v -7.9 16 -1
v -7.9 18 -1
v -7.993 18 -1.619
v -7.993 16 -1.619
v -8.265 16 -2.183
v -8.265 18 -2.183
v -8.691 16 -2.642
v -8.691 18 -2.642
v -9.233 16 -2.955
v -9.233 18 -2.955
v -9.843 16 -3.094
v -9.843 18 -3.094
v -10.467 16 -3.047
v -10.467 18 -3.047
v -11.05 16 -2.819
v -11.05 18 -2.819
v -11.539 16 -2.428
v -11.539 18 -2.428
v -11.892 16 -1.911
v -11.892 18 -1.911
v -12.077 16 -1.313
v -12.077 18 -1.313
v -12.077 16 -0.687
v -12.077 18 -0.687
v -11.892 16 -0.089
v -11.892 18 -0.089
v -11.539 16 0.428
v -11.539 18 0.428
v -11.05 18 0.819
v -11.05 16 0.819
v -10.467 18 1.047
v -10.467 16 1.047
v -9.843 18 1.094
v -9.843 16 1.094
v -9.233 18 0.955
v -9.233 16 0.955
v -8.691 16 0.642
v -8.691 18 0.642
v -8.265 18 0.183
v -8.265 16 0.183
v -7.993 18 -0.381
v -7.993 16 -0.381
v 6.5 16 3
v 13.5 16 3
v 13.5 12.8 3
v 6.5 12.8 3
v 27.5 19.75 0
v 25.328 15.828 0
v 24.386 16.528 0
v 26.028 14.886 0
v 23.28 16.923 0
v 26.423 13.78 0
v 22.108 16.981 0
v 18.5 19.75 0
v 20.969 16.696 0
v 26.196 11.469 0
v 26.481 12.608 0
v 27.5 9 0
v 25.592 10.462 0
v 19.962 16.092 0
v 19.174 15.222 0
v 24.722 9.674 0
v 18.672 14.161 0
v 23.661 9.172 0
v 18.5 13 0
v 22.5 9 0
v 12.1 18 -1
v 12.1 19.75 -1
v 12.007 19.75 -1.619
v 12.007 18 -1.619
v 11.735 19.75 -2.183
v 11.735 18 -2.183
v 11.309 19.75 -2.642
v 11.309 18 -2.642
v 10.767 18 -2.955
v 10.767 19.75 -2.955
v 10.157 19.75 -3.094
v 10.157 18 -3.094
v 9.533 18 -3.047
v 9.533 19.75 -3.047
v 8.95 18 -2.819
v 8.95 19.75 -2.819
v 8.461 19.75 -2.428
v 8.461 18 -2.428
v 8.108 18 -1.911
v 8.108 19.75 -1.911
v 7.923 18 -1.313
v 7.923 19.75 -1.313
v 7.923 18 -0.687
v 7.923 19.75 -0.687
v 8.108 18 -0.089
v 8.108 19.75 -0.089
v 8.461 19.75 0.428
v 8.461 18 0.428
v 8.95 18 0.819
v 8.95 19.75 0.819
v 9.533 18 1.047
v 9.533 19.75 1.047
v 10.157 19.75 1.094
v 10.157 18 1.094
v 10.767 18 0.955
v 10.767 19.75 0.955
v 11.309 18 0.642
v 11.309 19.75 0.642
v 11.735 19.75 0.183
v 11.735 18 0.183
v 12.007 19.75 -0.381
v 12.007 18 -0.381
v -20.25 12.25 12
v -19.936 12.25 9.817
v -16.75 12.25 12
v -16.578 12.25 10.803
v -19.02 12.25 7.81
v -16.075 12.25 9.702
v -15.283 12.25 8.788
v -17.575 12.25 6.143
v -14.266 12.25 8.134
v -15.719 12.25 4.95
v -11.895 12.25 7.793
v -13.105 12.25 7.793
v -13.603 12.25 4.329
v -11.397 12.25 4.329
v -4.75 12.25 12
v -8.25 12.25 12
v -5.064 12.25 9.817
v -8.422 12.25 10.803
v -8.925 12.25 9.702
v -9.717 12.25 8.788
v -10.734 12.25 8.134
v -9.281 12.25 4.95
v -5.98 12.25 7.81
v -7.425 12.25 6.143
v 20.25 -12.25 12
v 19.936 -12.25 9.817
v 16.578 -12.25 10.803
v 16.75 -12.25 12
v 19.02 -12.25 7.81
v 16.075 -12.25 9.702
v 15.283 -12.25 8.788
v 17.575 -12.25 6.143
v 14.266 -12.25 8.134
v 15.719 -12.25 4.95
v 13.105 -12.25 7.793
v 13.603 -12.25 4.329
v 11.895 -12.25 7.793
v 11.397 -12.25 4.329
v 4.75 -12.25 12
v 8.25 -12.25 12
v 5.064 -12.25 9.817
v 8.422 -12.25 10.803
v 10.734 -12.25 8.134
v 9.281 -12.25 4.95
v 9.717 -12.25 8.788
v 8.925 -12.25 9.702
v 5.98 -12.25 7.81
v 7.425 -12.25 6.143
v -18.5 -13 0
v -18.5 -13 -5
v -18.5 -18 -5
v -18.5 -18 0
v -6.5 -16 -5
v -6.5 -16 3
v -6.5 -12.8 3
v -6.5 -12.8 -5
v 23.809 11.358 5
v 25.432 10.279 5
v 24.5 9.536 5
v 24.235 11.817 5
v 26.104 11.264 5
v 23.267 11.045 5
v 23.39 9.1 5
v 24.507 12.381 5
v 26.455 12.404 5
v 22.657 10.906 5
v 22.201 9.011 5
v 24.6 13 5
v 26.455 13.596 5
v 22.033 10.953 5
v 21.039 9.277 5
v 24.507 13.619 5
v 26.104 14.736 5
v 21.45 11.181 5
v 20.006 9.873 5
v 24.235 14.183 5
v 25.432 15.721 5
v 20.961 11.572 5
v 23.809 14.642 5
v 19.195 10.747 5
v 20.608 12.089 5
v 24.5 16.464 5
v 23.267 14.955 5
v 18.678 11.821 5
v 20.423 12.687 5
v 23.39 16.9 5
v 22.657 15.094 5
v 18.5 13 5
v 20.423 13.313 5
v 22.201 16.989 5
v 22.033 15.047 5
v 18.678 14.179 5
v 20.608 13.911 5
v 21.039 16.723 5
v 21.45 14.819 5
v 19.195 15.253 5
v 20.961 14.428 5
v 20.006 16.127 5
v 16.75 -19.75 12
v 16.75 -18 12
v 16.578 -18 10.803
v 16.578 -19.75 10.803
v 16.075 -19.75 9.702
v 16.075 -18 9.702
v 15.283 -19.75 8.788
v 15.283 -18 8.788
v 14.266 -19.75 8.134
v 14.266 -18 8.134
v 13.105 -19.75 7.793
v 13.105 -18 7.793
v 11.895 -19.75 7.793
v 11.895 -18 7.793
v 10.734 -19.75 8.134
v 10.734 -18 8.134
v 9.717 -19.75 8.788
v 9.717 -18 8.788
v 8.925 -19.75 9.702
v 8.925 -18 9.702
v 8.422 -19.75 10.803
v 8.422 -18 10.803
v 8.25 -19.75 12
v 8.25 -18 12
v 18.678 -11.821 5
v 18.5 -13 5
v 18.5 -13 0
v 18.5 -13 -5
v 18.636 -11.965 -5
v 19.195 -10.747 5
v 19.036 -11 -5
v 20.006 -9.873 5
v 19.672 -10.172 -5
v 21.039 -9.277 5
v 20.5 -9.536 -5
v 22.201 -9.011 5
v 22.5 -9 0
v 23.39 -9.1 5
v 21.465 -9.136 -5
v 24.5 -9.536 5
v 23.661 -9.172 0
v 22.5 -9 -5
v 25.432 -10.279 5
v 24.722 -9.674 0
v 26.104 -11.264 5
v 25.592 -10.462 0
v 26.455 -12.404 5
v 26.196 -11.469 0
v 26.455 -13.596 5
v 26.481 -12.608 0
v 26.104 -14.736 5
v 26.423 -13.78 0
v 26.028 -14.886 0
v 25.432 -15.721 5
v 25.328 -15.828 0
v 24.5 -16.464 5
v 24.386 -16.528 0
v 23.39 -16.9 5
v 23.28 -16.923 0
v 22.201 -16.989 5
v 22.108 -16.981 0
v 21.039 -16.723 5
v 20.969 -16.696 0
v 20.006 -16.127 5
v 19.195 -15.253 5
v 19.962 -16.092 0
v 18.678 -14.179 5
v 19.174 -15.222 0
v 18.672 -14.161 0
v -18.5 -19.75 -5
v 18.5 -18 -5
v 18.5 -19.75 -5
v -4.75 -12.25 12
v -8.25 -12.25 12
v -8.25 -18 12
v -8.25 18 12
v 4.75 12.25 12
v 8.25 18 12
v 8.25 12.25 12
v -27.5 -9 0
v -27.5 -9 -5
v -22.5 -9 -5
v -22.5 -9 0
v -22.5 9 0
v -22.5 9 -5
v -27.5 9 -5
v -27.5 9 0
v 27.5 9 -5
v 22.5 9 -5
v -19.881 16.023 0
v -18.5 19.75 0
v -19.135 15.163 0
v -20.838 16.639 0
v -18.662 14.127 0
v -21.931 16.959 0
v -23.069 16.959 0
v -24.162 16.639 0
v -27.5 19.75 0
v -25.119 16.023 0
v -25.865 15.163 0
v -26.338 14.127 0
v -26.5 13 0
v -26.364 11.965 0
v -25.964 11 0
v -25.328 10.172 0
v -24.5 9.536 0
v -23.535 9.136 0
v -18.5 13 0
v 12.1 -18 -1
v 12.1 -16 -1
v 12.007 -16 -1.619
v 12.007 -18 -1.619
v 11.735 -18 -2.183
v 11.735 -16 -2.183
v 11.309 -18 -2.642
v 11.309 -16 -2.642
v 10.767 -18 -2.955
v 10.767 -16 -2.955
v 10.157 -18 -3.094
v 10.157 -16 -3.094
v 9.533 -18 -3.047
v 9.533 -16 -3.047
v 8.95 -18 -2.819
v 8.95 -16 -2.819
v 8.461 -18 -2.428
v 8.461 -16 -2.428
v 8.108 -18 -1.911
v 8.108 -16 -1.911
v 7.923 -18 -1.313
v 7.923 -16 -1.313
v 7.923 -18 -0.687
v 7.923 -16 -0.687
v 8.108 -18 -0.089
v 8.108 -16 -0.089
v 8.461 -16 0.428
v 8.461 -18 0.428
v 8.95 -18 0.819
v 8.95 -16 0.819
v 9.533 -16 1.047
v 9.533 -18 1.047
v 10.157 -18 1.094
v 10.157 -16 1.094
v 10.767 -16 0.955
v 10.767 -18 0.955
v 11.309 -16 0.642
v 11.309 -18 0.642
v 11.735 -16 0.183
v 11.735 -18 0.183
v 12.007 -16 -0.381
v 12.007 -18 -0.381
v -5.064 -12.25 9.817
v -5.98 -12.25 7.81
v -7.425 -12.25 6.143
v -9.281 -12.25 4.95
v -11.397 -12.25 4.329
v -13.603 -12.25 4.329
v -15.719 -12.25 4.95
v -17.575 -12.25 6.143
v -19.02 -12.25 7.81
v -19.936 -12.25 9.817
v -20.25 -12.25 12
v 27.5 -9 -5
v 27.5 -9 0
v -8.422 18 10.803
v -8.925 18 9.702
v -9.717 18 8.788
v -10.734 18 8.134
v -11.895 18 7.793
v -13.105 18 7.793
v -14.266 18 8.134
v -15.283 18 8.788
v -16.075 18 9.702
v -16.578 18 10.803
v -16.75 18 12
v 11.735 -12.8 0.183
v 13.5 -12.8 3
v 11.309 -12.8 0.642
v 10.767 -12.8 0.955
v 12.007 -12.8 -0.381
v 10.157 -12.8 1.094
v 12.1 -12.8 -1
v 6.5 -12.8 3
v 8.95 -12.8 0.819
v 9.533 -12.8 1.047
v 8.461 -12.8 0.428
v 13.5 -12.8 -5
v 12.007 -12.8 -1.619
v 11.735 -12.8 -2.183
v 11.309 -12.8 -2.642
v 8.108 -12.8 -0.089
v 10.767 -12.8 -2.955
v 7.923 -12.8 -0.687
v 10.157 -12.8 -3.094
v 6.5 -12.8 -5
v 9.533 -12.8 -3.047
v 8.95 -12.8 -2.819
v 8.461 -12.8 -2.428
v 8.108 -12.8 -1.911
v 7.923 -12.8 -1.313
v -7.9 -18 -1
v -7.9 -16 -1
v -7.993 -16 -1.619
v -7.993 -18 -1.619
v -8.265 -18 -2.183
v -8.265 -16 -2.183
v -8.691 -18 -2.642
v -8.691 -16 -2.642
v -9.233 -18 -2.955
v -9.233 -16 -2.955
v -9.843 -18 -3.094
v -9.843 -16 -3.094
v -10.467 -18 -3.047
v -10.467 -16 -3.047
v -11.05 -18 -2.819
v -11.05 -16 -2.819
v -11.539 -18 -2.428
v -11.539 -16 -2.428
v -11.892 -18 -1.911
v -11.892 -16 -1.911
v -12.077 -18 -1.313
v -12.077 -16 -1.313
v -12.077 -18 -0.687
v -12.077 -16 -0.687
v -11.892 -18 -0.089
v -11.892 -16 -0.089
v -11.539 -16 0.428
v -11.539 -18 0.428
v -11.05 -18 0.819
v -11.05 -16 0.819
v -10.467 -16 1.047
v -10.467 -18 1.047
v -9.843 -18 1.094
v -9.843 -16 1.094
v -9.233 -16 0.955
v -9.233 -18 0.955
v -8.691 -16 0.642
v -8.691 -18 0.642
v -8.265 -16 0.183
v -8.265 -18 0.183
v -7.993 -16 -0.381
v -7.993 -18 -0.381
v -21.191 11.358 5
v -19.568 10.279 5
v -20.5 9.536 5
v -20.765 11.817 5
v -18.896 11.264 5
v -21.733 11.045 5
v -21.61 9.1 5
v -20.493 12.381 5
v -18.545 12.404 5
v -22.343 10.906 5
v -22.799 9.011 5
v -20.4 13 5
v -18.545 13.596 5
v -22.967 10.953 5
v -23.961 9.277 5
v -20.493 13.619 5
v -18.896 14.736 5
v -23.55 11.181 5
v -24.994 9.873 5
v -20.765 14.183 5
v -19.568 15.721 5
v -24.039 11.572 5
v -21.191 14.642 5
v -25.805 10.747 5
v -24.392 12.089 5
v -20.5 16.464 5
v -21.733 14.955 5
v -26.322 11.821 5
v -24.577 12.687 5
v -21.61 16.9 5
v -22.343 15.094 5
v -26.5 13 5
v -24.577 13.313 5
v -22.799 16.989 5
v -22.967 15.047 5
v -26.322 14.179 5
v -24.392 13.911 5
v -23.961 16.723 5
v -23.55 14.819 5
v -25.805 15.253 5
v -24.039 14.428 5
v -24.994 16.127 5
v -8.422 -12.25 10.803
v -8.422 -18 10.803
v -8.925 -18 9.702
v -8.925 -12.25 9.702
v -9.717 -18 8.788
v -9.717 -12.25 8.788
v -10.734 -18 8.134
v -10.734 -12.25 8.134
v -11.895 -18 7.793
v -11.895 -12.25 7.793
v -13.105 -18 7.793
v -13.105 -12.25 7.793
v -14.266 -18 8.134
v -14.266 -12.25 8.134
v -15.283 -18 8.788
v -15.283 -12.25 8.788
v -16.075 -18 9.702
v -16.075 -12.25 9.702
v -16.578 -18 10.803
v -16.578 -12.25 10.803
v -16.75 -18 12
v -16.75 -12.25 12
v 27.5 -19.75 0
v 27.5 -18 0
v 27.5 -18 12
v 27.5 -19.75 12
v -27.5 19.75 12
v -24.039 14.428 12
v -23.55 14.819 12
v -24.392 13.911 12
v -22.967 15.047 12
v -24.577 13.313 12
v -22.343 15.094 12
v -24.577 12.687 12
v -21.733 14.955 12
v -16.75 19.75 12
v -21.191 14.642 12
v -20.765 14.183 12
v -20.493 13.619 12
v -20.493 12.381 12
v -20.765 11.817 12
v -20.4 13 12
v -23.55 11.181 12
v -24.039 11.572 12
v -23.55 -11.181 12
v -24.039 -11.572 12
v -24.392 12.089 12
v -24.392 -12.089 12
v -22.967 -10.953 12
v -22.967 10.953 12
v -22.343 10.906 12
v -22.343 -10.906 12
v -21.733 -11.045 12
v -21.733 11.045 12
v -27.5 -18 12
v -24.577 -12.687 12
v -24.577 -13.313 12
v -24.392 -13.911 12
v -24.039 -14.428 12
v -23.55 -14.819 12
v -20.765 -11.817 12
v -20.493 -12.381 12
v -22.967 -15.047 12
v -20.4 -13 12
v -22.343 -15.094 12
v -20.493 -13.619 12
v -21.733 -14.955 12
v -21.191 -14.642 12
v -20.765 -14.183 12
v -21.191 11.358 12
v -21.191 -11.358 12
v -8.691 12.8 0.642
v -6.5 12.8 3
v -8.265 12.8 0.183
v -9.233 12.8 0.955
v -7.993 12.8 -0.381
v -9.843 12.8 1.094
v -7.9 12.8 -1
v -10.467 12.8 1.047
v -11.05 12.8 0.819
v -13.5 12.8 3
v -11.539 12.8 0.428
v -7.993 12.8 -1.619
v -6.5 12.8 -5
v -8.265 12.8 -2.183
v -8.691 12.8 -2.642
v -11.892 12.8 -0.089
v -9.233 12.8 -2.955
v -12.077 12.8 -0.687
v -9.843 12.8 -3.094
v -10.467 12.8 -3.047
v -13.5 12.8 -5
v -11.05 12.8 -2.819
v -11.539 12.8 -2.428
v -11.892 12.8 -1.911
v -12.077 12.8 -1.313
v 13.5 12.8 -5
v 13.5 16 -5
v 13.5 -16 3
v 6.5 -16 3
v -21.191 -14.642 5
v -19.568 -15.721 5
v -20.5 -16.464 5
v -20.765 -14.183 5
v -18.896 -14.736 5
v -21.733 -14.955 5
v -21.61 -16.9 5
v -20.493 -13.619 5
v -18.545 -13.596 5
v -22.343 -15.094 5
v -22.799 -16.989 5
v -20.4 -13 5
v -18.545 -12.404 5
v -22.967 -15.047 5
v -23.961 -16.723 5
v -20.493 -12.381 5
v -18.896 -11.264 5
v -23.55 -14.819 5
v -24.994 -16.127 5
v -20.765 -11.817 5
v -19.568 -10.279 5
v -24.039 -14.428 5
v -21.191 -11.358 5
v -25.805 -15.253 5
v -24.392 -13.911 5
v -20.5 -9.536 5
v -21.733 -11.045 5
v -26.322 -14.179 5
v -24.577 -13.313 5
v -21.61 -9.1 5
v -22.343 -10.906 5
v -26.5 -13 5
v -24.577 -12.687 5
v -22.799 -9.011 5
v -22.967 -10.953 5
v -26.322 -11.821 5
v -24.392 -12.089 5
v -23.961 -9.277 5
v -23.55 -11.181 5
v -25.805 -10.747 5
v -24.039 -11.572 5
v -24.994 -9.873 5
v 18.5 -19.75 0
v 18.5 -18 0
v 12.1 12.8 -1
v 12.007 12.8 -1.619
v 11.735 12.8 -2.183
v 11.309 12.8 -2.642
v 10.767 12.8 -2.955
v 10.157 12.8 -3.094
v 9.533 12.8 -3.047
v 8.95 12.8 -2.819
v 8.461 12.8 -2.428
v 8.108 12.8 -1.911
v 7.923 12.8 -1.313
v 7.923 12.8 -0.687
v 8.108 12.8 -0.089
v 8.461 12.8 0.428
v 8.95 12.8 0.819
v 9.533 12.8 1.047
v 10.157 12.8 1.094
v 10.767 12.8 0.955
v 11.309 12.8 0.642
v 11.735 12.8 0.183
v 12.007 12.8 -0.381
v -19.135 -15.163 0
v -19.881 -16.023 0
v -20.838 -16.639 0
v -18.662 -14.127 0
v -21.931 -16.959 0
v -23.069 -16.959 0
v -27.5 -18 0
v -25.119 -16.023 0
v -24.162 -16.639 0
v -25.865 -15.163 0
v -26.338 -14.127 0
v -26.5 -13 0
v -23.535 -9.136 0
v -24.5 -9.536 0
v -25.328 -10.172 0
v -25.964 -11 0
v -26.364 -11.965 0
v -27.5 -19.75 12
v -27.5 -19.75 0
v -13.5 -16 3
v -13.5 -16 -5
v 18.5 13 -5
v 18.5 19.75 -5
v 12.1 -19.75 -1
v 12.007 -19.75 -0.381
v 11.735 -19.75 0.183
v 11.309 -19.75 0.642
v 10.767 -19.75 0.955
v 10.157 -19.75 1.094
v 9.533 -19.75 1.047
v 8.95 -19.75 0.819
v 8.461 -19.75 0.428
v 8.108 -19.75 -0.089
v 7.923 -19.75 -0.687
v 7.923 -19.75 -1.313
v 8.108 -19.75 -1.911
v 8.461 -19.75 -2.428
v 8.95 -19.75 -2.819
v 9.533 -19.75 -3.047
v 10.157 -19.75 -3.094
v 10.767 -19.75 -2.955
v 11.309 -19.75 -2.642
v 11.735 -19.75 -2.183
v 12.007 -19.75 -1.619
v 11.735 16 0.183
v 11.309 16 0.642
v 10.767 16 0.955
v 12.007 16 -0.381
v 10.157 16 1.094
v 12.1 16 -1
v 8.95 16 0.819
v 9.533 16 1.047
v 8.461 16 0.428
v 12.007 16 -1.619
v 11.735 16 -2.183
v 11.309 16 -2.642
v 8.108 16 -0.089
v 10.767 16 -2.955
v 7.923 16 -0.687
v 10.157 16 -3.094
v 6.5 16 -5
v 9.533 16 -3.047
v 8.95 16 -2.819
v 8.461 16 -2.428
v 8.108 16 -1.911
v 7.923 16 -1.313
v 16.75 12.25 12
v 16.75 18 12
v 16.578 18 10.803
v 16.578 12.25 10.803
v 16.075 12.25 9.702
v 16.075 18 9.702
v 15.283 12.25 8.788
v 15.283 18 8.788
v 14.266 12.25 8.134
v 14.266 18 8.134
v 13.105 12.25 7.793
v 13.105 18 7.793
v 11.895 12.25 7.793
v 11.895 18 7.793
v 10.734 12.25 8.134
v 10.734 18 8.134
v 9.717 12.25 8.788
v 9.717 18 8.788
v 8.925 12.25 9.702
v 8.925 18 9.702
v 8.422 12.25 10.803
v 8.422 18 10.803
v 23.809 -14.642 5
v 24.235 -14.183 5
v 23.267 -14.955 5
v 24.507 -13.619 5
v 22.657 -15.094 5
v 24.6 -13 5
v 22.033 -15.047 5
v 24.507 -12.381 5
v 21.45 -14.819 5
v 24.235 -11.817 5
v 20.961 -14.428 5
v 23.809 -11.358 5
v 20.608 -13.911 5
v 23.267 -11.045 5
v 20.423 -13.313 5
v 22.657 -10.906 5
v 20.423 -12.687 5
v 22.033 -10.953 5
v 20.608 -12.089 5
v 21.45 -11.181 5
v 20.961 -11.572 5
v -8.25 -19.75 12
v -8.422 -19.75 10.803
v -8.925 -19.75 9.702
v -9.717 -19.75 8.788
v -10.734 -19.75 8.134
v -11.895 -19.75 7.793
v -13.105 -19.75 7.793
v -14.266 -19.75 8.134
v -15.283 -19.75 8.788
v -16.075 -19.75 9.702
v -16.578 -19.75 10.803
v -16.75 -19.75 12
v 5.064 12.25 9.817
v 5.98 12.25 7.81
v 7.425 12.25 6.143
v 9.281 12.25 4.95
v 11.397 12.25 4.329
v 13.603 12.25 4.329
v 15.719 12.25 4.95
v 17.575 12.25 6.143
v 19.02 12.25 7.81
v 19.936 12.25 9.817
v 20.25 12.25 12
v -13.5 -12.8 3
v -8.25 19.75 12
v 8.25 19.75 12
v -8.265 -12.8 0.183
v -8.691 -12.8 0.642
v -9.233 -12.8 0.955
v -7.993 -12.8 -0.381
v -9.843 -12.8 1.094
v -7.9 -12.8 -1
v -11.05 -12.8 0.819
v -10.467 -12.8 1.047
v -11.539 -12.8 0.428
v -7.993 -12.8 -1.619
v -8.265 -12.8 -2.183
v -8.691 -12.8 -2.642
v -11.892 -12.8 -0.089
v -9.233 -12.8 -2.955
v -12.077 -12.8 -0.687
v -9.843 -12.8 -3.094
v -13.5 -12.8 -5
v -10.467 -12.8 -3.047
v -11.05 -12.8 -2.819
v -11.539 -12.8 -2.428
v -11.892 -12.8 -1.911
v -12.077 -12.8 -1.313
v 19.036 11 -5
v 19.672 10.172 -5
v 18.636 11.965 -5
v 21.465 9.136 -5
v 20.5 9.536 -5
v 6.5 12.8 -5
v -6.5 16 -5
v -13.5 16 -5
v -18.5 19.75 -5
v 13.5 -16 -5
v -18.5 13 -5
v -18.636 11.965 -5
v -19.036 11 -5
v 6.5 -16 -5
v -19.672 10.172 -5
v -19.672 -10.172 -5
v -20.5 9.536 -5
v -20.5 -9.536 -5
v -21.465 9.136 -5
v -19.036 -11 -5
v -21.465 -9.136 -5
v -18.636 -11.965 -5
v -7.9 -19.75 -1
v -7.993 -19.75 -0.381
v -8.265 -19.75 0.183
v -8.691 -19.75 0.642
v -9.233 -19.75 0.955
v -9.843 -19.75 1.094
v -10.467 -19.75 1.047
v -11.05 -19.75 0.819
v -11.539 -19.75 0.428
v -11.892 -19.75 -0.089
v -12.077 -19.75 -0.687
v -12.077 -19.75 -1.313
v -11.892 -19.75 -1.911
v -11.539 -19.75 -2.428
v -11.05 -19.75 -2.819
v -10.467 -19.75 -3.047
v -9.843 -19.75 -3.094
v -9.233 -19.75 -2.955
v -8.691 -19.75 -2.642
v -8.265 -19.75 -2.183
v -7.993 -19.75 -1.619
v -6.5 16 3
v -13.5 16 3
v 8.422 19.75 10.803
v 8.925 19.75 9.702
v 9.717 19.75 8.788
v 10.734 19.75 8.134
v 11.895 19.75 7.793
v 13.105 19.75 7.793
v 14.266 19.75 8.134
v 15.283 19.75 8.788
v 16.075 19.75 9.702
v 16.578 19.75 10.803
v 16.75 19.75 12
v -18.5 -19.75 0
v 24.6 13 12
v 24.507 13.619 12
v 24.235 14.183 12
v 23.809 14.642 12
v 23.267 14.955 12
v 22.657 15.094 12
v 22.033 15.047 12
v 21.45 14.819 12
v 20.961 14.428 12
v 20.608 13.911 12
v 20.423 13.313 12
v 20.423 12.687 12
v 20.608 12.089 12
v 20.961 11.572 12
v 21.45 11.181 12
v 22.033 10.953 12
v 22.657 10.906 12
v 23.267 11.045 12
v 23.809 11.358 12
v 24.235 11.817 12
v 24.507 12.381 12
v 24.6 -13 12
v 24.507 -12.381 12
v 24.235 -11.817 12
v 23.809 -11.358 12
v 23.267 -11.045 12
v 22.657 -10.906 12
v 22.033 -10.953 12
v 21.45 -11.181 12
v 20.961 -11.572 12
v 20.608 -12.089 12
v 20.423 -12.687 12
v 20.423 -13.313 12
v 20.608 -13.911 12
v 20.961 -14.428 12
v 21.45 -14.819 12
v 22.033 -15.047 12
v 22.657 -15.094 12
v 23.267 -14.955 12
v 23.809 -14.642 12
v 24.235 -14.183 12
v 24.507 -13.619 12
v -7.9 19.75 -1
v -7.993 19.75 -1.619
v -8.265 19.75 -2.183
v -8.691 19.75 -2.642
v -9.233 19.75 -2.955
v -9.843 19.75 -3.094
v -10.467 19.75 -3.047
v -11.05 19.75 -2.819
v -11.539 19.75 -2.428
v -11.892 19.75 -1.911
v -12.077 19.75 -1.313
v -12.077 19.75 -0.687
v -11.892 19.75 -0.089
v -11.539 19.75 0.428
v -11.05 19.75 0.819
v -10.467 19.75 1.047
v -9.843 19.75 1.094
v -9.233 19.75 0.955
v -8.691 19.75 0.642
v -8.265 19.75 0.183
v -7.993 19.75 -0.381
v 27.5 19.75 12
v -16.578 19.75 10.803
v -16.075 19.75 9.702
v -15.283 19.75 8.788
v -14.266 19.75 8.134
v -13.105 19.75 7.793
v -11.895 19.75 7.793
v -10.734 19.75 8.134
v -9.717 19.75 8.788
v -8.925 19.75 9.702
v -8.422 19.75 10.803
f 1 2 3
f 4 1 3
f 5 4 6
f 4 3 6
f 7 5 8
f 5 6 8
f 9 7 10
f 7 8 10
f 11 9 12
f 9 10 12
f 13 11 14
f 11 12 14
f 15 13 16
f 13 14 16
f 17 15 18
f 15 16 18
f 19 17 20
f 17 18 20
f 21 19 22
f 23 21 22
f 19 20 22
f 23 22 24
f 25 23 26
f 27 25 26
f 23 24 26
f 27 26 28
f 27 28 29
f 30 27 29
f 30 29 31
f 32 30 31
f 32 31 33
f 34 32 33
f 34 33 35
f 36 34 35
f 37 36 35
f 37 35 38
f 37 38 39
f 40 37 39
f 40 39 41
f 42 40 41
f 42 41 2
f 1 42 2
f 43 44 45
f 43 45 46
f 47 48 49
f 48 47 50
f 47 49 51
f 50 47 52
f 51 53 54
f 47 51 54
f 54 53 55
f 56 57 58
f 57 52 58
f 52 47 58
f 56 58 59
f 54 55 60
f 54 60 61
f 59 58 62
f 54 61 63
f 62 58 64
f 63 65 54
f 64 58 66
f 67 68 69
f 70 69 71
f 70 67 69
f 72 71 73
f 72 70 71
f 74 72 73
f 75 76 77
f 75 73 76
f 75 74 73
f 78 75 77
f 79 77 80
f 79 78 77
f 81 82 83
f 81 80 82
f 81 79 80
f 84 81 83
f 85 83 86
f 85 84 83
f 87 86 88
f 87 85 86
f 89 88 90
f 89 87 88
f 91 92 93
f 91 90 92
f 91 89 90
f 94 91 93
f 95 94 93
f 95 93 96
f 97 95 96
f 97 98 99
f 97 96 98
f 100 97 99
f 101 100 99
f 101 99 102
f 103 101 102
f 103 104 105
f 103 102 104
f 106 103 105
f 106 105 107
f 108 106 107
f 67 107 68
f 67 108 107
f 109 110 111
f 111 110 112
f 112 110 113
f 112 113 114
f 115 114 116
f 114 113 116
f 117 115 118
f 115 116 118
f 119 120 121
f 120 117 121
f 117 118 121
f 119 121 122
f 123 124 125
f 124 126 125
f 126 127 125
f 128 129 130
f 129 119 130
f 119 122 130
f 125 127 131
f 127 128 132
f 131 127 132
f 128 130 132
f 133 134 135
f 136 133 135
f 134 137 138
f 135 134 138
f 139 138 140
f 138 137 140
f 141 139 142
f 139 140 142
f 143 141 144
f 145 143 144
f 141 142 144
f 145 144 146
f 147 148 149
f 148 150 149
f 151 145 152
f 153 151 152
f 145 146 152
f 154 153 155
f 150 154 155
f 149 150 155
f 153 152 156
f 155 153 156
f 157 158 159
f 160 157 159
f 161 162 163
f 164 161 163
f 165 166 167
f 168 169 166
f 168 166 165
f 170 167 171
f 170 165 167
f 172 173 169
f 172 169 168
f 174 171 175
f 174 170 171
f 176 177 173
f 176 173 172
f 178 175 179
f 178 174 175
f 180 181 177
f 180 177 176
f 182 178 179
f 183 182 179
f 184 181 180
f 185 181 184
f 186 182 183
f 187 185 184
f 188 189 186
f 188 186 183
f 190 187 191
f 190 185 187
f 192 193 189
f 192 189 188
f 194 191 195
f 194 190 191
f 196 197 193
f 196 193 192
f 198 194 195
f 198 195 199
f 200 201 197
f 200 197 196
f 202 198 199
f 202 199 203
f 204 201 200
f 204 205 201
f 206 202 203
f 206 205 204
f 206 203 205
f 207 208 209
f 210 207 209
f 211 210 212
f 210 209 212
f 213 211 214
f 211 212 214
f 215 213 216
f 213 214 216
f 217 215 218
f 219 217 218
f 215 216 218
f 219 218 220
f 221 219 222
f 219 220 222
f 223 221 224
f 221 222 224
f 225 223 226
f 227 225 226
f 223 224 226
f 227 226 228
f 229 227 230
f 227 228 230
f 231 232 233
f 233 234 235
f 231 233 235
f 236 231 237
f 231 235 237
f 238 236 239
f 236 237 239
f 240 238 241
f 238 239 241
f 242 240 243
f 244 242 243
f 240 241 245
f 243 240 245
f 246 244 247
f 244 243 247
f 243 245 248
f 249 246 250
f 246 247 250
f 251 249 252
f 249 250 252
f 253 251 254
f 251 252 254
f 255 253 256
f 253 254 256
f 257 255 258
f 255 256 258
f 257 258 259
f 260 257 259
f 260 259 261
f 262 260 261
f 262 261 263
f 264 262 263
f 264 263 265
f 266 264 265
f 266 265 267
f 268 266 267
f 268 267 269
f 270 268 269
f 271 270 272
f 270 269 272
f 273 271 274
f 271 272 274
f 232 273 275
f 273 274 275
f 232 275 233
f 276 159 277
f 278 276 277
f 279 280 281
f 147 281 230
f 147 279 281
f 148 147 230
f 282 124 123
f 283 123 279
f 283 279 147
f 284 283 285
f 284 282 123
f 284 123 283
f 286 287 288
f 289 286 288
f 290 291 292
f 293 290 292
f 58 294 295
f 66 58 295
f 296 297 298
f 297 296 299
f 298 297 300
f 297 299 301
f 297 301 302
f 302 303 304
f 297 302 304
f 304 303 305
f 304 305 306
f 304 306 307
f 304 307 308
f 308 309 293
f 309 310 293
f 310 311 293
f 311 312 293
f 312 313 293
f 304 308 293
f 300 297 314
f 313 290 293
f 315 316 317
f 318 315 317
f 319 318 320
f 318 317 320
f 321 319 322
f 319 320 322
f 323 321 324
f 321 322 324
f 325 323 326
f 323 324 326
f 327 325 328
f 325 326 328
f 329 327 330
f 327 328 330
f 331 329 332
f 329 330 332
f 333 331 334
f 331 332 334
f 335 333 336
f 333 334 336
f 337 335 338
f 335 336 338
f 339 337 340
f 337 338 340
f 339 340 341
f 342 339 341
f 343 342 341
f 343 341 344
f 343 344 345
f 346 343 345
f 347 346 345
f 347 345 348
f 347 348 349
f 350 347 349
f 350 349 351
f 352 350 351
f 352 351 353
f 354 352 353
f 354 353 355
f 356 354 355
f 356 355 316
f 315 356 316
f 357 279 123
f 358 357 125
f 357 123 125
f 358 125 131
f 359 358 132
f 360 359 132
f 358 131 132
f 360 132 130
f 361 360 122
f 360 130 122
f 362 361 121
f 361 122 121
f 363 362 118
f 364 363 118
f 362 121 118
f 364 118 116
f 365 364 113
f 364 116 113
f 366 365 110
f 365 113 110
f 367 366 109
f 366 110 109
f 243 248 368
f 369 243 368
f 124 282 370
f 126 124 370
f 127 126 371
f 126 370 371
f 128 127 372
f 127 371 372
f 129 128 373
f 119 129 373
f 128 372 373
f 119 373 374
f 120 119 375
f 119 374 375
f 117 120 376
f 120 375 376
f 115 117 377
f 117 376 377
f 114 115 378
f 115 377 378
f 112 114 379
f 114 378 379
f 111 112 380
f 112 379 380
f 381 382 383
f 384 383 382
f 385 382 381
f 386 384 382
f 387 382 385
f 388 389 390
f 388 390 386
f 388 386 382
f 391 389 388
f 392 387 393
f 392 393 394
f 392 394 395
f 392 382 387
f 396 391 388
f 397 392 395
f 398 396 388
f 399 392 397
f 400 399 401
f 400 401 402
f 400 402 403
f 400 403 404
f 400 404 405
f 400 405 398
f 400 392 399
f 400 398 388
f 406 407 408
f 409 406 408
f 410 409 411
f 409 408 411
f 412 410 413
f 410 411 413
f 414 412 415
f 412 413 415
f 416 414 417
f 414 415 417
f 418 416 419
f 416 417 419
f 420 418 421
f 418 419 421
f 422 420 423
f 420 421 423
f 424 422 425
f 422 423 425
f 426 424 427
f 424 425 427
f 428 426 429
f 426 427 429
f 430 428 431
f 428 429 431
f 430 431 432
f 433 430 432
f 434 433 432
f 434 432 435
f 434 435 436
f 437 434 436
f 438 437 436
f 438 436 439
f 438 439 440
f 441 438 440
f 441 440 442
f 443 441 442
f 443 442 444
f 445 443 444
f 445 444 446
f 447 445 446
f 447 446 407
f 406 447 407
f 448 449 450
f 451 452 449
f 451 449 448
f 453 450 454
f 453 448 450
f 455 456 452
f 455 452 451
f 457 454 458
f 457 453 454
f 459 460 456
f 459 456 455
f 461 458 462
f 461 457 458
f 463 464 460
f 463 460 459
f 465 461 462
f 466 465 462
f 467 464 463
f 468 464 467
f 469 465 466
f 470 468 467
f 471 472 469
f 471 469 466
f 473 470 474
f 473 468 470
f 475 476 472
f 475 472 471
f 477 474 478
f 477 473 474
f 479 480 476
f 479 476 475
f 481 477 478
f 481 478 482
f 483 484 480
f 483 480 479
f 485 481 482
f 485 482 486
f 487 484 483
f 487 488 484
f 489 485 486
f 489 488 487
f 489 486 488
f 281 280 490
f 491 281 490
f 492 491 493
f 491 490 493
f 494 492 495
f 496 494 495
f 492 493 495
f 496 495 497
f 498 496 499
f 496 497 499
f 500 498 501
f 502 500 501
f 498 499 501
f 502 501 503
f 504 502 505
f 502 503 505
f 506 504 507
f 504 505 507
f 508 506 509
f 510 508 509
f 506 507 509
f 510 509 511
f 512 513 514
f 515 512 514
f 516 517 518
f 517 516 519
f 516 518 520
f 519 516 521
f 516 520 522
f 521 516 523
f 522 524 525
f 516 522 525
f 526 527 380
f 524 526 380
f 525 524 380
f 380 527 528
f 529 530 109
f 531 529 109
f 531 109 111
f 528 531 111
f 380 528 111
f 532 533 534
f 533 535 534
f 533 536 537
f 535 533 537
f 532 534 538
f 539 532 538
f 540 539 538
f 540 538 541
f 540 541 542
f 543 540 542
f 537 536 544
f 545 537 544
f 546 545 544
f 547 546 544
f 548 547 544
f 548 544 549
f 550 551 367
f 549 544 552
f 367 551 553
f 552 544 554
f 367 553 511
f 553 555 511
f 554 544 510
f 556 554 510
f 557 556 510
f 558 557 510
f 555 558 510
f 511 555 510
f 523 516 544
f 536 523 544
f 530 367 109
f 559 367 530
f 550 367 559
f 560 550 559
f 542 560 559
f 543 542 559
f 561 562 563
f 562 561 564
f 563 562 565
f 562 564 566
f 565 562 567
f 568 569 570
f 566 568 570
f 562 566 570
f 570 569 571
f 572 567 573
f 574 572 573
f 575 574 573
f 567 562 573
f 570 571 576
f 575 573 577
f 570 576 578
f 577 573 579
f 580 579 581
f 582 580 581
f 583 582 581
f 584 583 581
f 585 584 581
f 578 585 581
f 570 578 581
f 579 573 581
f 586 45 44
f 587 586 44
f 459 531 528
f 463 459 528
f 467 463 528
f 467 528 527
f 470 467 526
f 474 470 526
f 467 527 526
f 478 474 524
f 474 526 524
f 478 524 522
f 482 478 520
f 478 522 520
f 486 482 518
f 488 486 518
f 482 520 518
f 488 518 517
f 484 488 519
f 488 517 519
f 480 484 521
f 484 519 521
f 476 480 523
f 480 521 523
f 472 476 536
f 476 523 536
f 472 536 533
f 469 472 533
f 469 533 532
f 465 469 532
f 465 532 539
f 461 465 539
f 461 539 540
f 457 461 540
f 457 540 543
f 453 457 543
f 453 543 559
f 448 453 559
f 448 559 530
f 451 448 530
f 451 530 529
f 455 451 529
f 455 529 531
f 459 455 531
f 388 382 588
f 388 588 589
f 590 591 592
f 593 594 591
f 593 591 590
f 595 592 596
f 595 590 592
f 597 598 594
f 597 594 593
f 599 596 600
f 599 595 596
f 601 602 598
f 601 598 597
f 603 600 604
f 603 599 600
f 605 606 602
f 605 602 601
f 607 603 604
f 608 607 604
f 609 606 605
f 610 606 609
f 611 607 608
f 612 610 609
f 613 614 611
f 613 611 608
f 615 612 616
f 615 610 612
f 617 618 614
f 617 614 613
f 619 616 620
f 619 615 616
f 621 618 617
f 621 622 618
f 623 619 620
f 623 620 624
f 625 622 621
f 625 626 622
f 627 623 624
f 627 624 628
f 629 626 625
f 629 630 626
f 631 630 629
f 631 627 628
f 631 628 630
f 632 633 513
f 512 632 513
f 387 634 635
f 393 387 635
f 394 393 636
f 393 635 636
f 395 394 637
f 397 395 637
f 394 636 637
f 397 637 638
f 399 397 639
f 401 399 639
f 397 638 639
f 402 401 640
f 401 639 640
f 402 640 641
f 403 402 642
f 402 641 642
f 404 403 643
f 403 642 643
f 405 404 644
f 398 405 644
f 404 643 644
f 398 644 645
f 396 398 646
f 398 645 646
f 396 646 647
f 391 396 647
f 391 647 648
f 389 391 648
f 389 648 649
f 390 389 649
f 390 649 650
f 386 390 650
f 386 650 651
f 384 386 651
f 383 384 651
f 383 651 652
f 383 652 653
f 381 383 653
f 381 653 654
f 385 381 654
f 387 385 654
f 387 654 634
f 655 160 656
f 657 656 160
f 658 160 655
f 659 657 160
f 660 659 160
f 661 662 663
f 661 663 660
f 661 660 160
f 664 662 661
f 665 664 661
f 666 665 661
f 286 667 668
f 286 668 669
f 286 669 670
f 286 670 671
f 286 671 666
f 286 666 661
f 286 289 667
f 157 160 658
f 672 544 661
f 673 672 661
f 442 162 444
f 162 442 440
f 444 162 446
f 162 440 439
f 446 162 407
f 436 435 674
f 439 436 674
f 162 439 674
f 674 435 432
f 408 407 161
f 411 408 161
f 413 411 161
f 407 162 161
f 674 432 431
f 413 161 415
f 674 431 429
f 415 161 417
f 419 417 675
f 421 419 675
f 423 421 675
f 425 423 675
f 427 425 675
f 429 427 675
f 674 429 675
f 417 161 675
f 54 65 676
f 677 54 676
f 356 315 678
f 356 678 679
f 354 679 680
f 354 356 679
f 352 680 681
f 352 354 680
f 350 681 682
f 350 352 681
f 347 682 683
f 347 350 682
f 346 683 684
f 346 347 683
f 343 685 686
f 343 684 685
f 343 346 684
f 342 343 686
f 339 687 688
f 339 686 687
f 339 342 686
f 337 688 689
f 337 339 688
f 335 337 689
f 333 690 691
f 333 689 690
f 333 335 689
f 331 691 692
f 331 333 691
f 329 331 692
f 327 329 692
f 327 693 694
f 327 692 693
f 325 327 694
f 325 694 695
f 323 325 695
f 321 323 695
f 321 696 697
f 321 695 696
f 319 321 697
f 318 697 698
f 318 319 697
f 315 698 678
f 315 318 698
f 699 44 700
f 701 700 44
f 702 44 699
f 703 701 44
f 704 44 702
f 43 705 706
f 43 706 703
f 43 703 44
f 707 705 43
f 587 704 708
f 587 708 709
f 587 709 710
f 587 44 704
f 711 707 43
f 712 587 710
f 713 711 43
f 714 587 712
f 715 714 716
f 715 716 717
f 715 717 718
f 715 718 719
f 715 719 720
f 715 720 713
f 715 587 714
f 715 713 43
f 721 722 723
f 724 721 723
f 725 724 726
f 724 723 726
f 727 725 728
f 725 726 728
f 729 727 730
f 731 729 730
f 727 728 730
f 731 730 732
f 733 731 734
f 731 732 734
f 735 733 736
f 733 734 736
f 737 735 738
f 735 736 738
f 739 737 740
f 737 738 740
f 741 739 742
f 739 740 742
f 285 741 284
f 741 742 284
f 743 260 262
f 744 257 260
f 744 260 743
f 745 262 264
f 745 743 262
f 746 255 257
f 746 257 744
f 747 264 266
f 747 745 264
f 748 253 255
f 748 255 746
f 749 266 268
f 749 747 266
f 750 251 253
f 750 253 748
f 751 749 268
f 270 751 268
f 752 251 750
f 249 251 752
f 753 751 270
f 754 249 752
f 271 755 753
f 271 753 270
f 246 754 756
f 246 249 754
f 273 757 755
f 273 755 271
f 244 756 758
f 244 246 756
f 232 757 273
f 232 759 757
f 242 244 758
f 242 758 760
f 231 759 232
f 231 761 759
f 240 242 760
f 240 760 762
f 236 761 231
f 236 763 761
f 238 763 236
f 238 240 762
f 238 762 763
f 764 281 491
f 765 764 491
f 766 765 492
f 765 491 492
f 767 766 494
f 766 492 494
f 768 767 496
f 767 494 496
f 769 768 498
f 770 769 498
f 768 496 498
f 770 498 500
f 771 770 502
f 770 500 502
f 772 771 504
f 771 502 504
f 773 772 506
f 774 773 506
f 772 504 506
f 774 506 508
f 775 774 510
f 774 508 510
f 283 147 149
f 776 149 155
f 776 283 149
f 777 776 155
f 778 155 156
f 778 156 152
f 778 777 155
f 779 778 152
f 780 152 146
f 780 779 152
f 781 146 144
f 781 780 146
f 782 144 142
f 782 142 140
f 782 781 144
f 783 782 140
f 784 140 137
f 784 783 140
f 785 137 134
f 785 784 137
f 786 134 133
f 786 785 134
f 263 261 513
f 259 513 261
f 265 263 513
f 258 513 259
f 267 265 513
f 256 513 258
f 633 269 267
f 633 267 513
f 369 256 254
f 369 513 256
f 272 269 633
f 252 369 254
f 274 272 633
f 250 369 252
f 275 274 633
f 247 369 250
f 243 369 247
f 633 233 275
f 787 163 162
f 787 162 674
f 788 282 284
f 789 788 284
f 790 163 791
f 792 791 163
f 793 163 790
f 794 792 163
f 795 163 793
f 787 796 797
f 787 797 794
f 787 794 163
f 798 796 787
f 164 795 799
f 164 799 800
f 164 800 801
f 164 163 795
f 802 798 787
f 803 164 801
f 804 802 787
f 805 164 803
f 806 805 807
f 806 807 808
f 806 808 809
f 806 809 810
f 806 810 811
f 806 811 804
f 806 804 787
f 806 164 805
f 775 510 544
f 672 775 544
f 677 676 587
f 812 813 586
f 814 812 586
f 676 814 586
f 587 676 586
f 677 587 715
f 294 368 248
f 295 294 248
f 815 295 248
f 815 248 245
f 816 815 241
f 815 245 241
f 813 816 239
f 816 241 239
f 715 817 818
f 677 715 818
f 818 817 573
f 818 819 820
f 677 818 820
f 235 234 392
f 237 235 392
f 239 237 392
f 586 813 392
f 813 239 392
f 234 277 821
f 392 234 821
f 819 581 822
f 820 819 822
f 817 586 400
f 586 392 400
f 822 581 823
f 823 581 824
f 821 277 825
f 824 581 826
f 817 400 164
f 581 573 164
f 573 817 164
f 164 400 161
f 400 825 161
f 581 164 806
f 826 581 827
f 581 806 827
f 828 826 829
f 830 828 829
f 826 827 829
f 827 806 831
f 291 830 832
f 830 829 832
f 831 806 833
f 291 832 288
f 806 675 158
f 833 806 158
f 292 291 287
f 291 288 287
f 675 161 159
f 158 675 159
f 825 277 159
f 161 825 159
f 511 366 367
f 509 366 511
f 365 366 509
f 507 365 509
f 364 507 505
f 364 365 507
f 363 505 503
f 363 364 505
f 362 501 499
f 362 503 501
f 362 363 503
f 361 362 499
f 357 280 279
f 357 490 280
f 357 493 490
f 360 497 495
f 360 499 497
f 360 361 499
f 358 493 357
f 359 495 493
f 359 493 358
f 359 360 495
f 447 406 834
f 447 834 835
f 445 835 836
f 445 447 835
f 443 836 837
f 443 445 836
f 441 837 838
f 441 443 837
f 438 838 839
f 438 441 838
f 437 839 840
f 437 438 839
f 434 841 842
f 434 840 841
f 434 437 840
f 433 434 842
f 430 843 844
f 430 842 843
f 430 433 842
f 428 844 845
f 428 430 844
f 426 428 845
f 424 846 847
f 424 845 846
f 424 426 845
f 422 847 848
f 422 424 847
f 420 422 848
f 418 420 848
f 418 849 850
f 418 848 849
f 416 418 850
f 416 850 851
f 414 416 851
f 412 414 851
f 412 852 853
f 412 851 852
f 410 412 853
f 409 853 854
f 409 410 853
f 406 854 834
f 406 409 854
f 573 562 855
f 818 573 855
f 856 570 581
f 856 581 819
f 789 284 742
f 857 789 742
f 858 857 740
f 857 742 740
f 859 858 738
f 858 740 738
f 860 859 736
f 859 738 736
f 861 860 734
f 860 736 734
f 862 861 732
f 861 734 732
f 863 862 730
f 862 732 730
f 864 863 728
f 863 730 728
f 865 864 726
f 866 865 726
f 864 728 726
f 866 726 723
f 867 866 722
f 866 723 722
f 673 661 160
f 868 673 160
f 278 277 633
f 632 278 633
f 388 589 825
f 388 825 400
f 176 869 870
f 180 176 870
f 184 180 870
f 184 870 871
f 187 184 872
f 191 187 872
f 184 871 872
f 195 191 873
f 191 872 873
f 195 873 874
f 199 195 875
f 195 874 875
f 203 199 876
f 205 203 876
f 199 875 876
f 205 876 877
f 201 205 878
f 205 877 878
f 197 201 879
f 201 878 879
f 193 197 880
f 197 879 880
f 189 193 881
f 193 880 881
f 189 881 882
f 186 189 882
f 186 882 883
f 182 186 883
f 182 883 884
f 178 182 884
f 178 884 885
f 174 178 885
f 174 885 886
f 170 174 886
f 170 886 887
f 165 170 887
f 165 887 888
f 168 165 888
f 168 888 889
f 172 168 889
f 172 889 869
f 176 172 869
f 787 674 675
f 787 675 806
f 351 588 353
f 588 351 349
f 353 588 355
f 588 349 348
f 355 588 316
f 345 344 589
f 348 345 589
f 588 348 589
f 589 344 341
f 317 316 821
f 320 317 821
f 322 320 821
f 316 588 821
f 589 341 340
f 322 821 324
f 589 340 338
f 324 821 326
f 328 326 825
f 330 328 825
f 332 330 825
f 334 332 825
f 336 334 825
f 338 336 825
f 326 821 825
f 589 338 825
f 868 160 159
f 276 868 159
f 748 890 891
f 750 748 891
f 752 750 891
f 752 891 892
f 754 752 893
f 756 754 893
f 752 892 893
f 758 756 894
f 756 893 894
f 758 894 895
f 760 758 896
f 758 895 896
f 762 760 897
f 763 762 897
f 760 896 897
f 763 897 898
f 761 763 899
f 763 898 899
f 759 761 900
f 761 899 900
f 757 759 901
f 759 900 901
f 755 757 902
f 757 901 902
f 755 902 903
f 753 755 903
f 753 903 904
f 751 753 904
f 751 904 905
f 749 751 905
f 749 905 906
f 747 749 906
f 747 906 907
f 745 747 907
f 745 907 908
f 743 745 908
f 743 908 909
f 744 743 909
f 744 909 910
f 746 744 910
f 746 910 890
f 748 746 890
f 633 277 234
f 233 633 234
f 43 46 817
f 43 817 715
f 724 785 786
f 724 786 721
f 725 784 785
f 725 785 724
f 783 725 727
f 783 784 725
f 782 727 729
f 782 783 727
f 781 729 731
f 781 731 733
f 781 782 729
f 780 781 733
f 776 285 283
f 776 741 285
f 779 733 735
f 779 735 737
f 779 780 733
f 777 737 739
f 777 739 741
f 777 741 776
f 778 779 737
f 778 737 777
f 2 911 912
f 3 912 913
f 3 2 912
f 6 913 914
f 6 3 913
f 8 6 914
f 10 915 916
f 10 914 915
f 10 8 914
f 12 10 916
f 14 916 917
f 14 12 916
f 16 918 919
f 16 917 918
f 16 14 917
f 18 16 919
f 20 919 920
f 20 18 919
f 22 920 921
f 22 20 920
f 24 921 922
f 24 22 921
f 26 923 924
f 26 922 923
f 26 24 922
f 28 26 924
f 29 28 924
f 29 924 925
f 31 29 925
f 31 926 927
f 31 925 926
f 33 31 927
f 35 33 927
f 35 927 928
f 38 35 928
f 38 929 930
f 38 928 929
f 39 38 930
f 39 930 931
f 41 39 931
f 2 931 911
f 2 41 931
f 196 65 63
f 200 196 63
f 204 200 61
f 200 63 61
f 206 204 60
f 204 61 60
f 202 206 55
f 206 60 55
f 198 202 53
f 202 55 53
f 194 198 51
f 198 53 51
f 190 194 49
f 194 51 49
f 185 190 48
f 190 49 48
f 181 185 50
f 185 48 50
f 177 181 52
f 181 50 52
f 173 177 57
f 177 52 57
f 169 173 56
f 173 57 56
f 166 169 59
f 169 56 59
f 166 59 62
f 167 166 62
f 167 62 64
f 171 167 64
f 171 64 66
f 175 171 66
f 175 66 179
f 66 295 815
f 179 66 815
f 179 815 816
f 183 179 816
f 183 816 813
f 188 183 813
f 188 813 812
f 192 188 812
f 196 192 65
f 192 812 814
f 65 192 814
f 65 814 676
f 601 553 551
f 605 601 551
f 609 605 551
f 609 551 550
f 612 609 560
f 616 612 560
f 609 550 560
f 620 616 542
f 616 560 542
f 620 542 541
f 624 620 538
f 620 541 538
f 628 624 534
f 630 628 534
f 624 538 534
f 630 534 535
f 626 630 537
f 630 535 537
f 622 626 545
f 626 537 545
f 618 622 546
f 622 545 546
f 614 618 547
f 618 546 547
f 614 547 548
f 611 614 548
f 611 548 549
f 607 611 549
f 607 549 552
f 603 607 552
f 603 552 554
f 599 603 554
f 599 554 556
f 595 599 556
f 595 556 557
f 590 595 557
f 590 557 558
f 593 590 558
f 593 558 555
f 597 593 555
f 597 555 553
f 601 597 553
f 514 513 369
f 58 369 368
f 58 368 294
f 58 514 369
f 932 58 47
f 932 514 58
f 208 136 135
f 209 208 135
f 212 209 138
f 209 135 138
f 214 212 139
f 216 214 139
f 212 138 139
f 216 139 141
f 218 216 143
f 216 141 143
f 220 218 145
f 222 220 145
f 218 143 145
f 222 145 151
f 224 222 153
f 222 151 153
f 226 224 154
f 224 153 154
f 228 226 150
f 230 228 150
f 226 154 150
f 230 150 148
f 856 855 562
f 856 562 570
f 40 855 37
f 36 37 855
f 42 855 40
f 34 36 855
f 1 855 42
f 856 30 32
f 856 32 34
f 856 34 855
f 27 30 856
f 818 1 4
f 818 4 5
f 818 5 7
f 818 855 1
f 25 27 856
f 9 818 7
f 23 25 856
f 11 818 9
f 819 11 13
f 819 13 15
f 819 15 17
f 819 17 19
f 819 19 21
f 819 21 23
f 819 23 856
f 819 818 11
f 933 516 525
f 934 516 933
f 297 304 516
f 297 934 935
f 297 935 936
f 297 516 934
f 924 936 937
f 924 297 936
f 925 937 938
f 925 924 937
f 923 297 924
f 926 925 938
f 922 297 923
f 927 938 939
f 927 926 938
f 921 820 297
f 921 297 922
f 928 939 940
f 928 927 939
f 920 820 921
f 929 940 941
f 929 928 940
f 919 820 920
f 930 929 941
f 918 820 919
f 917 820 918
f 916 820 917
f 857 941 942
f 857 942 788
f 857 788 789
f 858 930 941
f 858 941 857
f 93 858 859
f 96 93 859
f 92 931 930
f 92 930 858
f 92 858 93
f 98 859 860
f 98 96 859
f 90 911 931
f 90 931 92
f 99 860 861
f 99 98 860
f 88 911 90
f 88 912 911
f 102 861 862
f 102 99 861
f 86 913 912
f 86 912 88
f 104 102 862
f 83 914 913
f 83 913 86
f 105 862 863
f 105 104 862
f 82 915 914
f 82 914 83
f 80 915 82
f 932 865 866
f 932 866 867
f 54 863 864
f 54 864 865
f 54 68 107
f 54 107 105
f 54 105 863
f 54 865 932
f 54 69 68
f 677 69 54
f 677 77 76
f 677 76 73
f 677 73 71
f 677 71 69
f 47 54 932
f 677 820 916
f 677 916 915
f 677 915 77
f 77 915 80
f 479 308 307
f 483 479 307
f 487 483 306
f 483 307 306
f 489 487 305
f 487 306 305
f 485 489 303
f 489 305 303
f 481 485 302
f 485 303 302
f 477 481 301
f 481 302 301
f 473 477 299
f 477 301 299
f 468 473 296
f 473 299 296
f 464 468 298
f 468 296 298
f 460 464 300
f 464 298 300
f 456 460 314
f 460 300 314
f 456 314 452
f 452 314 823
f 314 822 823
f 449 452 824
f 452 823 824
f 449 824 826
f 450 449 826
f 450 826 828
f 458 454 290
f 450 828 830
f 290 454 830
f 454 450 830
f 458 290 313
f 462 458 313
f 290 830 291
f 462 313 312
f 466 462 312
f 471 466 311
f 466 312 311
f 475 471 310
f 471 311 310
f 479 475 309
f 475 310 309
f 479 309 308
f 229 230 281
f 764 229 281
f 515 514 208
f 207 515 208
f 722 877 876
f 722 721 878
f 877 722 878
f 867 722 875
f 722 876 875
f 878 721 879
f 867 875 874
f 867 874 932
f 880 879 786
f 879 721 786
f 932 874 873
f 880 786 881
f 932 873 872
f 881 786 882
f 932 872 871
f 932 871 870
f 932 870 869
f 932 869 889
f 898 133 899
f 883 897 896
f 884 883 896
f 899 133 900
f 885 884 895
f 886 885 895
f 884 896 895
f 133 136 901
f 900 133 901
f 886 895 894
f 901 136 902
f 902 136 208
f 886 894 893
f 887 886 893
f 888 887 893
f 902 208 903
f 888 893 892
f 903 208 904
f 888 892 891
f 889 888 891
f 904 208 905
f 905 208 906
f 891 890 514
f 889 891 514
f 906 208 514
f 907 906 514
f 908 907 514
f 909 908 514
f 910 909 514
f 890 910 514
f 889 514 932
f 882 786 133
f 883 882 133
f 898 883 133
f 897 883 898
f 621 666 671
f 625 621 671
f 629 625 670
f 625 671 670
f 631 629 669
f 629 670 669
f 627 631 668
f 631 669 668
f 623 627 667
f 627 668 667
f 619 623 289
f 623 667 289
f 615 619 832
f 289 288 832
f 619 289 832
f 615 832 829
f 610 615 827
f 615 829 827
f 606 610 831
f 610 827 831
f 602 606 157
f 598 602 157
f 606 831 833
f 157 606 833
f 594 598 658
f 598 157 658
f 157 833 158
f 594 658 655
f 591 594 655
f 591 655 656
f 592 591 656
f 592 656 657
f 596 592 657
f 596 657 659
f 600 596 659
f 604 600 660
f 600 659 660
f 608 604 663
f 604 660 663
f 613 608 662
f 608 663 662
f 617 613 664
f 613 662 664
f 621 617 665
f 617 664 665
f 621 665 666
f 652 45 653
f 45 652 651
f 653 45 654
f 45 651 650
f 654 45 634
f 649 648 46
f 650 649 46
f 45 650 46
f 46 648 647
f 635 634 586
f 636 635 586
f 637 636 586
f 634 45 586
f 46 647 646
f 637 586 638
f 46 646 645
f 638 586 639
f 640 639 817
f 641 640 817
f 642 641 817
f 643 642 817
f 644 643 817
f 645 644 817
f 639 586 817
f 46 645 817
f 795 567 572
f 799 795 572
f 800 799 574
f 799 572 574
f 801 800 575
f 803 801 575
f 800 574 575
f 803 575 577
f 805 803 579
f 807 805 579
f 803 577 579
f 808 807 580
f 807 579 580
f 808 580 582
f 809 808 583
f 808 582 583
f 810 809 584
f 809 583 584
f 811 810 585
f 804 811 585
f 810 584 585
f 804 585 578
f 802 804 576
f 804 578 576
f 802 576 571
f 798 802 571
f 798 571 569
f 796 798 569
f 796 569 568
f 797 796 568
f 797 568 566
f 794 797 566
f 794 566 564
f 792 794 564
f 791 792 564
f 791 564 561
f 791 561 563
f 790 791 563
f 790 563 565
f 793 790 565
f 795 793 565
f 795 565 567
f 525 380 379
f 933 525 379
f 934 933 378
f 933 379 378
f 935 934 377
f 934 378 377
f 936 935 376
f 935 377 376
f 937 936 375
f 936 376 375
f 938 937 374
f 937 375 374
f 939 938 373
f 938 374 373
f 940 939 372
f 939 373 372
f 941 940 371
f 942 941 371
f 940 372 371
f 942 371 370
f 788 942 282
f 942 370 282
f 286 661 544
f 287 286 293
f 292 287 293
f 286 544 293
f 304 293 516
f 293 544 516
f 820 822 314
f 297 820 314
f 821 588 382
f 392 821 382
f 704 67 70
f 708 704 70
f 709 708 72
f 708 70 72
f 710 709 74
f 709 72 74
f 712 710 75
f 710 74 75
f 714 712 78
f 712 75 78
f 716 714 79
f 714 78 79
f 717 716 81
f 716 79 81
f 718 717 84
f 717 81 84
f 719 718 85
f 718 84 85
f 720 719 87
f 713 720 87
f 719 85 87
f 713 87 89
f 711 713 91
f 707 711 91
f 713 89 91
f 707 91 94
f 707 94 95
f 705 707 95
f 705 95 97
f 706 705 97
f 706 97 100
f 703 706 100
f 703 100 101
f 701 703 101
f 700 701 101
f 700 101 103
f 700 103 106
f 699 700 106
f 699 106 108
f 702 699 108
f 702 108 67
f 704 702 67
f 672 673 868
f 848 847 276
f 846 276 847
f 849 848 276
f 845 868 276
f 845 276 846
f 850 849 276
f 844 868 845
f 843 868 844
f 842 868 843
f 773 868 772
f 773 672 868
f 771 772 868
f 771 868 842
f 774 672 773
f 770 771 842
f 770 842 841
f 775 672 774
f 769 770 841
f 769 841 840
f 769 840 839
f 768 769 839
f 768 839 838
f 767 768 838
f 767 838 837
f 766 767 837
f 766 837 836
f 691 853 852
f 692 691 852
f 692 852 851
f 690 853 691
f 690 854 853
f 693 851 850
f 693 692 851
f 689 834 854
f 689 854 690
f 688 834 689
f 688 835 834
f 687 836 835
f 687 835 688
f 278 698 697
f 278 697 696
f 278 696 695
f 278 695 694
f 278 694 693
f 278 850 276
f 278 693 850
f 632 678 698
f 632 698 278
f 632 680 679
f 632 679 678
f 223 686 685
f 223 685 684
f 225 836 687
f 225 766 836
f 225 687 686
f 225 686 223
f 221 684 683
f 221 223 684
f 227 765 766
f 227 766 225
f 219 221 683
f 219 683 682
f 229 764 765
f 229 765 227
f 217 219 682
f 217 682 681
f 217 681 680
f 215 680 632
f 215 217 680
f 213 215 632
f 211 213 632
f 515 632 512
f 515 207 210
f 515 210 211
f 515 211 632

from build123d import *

# Parameters (mm, degrees)
ESQUISSE1_W             = 55
ESQUISSE1_H             = 45
BOSS_EXTRU_1_DEPTH      = 12
ESQUISSE2_R             = 4.25
ENL_V_MAT_EXTRU_1_DEPTH = 46
ESQUISSE3_R             = 7.75
ENL_V_MAT_EXTRU_2_DEPTH = 12.25
ESQUISSE9_W             = 61.062756781
ESQUISSE9_H             = 12.22812859
ESQUISSE9_W_2           = 59.427147224
ESQUISSE9_H_2           = 8.100161614
ENL_V_MAT_EXTRU_7_DEPTH = 31
SKETCH1_W               = 55
SKETCH1_H               = 36
BOSS_EXTRUDE1_DEPTH     = 5
SKETCH2_R               = 2.1
CUT_EXTRUDE1_DEPTH      = 18
SKETCH3_R               = 4
CUT_EXTRUDE2_DEPTH      = 10
CUT_EXTRUDE3_DEPTH      = 5
SKETCH5_R               = 2.1
CUT_EXTRUDE4_DEPTH      = 37
SKETCH7_R               = 2.1
BOSS_EXTRUDE4_DEPTH     = 2
SKETCH8_R               = 2.1
BOSS_EXTRUDE5_DEPTH     = 2
SKETCH9_W               = 7
SKETCH9_H               = 3.2
CUT_EXTRUDE6_DEPTH      = 8
CUT_EXTRUDE7_DEPTH      = 0.25
CUT_EXTRUDE8_DEPTH      = 0.25


with BuildPart() as part:
    # Esquisse1 → Boss.-Extru.1 (new body)
    with BuildSketch(Plane.XY):
        Rectangle(ESQUISSE1_W, ESQUISSE1_H)
    extrude(amount=BOSS_EXTRU_1_DEPTH)

    # Esquisse2 → Enlèv. mat.-Extru.1 (cut, through all)
    with BuildSketch(Plane(origin=(0, 22.5, 0), x_dir=(1, 0, 0), z_dir=(0, 1, 0))):
        with Locations((-12.5, -12)):
            Circle(ESQUISSE2_R)
        with Locations((12.5, -12)):
            Circle(ESQUISSE2_R)
    extrude(amount=-ENL_V_MAT_EXTRU_1_DEPTH, mode=Mode.SUBTRACT)

    # Esquisse3 → Enlèv. mat.-Extru.2 (cut, symmetric)
    with BuildSketch(Plane(origin=(0, 0, 0), x_dir=(1, 0, 0), z_dir=(0, 1, 0))):
        with Locations((-12.5, -12)):
            Circle(ESQUISSE3_R)
    enl_v_mat_extru_2 = extrude(amount=ENL_V_MAT_EXTRU_2_DEPTH, both=True, mode=Mode.SUBTRACT)

    # Esquisse9 → Enlèv. mat.-Extru.7 (cut)
    with BuildSketch(Plane.XY.offset(12)):
        with Locations((-0.389430846, -24.114064295)):
            Rectangle(ESQUISSE9_W, ESQUISSE9_H)
        with Locations((1.674552641, 22.050080807)):
            Rectangle(ESQUISSE9_W_2, ESQUISSE9_H_2)
    extrude(amount=-ENL_V_MAT_EXTRU_7_DEPTH, mode=Mode.SUBTRACT)

    # Sketch1 → Boss-Extrude1 (add)
    with BuildSketch(Plane(origin=(0, 0, 0), x_dir=(-1, 0, 0), z_dir=(0, 0, -1))):
        Rectangle(SKETCH1_W, SKETCH1_H)
    extrude(amount=BOSS_EXTRUDE1_DEPTH)

    # Sketch2 → Cut-Extrude1 (cut, through all)
    with BuildSketch(Plane.XY.offset(12)):
        with Locations((-22.5, 13)):
            Circle(SKETCH2_R)
        with Locations((22.5, 13)):
            Circle(SKETCH2_R)
        with Locations((22.5, -13)):
            Circle(SKETCH2_R)
        with Locations((-22.5, -13)):
            Circle(SKETCH2_R)
    extrude(amount=-CUT_EXTRUDE1_DEPTH, mode=Mode.SUBTRACT)

    # Sketch3 → Cut-Extrude2 (cut)
    with BuildSketch(Plane(origin=(0, 0, -5), x_dir=(-1, 0, 0), z_dir=(0, 0, -1))):
        with Locations((-22.5, 13)):
            Circle(SKETCH3_R)
        with Locations((22.5, 13)):
            Circle(SKETCH3_R)
        with Locations((22.5, -13)):
            Circle(SKETCH3_R)
        with Locations((-22.5, -13)):
            Circle(SKETCH3_R)
    extrude(amount=-CUT_EXTRUDE2_DEPTH, mode=Mode.SUBTRACT)

    # Sketch4 → Cut-Extrude3 (cut)
    with BuildSketch(Plane(origin=(0, 0, -5), x_dir=(-1, 0, 0), z_dir=(0, 0, -1))):
        with BuildLine():
            Line((-18.5, 13), (-18.5, 18))
            Line((-18.5, 18), (-27.5, 18))
            Line((-27.5, 18), (-27.5, 9))
            Line((-27.5, 9), (-22.5, 9))
            ThreePointArc((-22.5, 9), (-25.328427125, 15.828427125), (-18.5, 13))
        make_face()
        with BuildLine():
            Line((-22.5, -9), (-27.5, -9))
            Line((-27.5, -9), (-27.5, -18))
            Line((-27.5, -18), (-18.5, -18))
            Line((-18.5, -18), (-18.5, -13))
            ThreePointArc((-18.5, -13), (-25.328427125, -15.828427125), (-22.5, -9))
        make_face()
        with BuildLine():
            Line((27.5, -18), (27.5, -9))
            Line((27.5, -9), (22.5, -9))
            ThreePointArc((22.5, -9), (25.328427125, -15.828427125), (18.5, -13))
            Line((18.5, -13), (18.5, -18))
            Line((18.5, -18), (27.5, -18))
        make_face()
        with BuildLine():
            Line((27.5, 18), (18.5, 18))
            Line((18.5, 18), (18.5, 13))
            ThreePointArc((18.5, 13), (25.328427125, 15.828427125), (22.5, 9))
            Line((22.5, 9), (27.5, 9))
            Line((27.5, 9), (27.5, 18))
        make_face()
    extrude(amount=-CUT_EXTRUDE3_DEPTH, mode=Mode.SUBTRACT)

    # Sketch5 → Cut-Extrude4 (cut, through all)
    with BuildSketch(Plane(origin=(0, 18, 0), x_dir=(1, 0, 0), z_dir=(0, 1, 0))):
        with Locations((-10, 1)):
            Circle(SKETCH5_R)
        with Locations((10, 1)):
            Circle(SKETCH5_R)
    extrude(amount=-CUT_EXTRUDE4_DEPTH, mode=Mode.SUBTRACT)

    # Sketch7 → Boss-Extrude4 (add)
    with BuildSketch(Plane(origin=(0, 18, 0), x_dir=(1, 0, 0), z_dir=(0, 1, 0))):
        with BuildLine():
            Line((18.5, 5), (-18.5, 5))
            Line((-18.5, 5), (-18.5, 0))
            Line((-18.5, 0), (-27.5, 0))
            Line((-27.5, 0), (-27.5, -12))
            Line((-27.5, -12), (-16.75, -12))
            ThreePointArc((-16.75, -12), (-12.5, -7.75), (-8.25, -12))
            Line((-8.25, -12), (8.25, -12))
            ThreePointArc((8.25, -12), (12.5, -7.75), (16.75, -12))
            Line((16.75, -12), (27.5, -12))
            Line((27.5, -12), (27.5, 0))
            Line((27.5, 0), (18.5, 0))
            Line((18.5, 0), (18.5, 5))
        make_face()
        with Locations((10, 1)):
            Circle(SKETCH7_R, mode=Mode.SUBTRACT)
        with Locations((-10, 1)):
            Circle(SKETCH7_R, mode=Mode.SUBTRACT)
    extrude(amount=BOSS_EXTRUDE4_DEPTH)

    # Sketch8 → Boss-Extrude5 (add)
    with BuildSketch(Plane.XZ.offset(18)):
        with BuildLine():
            Line((-27.5, 0), (-18.5, 0))
            Line((-18.5, 0), (-18.5, -5))
            Line((-18.5, -5), (18.5, -5))
            Line((18.5, -5), (18.5, 0))
            Line((18.5, 0), (27.5, 0))
            Line((27.5, 0), (27.5, 12))
            Line((27.5, 12), (16.75, 12))
            ThreePointArc((16.75, 12), (12.5, 7.75), (8.25, 12))
            Line((8.25, 12), (-8.25, 12))
            ThreePointArc((-8.25, 12), (-12.5, 7.75), (-16.75, 12))
            Line((-16.75, 12), (-27.5, 12))
            Line((-27.5, 12), (-27.5, 0))
        make_face()
        with Locations((10, -1)):
            Circle(SKETCH8_R, mode=Mode.SUBTRACT)
        with Locations((-10, -1)):
            Circle(SKETCH8_R, mode=Mode.SUBTRACT)
    extrude(amount=BOSS_EXTRUDE5_DEPTH)

    # Sketch9 → Cut-Extrude6 (cut)
    with BuildSketch(Plane(origin=(0, 0, -5), x_dir=(-1, 0, 0), z_dir=(0, 0, -1))):
        with Locations((-10, 14.4)):
            Rectangle(SKETCH9_W, SKETCH9_H)
        with Locations((10, 14.4)):
            Rectangle(SKETCH9_W, SKETCH9_H)
        with Locations((10, -14.4)):
            Rectangle(SKETCH9_W, SKETCH9_H)
        with Locations((-10, -14.4)):
            Rectangle(SKETCH9_W, SKETCH9_H)
    extrude(amount=-CUT_EXTRUDE6_DEPTH, mode=Mode.SUBTRACT)

    # Mirror1: Enlèv. mat.-Extru.2 across plane
    add(enl_v_mat_extru_2.mirror(Plane.ZY), mode=Mode.SUBTRACT)

    # Sketch10 → Cut-Extrude7 (cut)
    with BuildSketch(Plane.XZ.offset(20)):
        with BuildLine():
            Line((-27.5, 12), (-27.5, 0))
            Line((-27.5, 0), (-18.5, 0))
            Line((-18.5, 0), (-18.5, -5))
            Line((-18.5, -5), (18.5, -5))
            Line((18.5, -5), (18.5, 0))
            Line((18.5, 0), (27.5, 0))
            Line((27.5, 0), (27.5, 12))
            Line((27.5, 12), (16.75, 12))
            ThreePointArc((16.75, 12), (12.5, 7.75), (8.25, 12))
            Line((8.25, 12), (-8.25, 12))
            ThreePointArc((-8.25, 12), (-12.5, 7.75), (-16.75, 12))
            Line((-16.75, 12), (-27.5, 12))
        make_face()
    extrude(amount=-CUT_EXTRUDE7_DEPTH, mode=Mode.SUBTRACT)

    # Sketch11 → Cut-Extrude8 (cut)
    with BuildSketch(Plane(origin=(0, 20, 0), x_dir=(1, 0, 0), z_dir=(0, 1, 0))):
        with BuildLine():
            Line((18.5, 0), (18.5, 5))
            Line((18.5, 5), (-18.5, 5))
            Line((-18.5, 5), (-18.5, 0))
            Line((-18.5, 0), (-27.5, 0))
            Line((-27.5, 0), (-27.5, -12))
            Line((-27.5, -12), (-16.75, -12))
            ThreePointArc((-16.75, -12), (-12.5, -7.75), (-8.25, -12))
            Line((-8.25, -12), (8.25, -12))
            ThreePointArc((8.25, -12), (12.5, -7.75), (16.75, -12))
            Line((16.75, -12), (27.5, -12))
            Line((27.5, -12), (27.5, 0))
            Line((27.5, 0), (18.5, 0))
        make_face()
    extrude(amount=-CUT_EXTRUDE8_DEPTH, mode=Mode.SUBTRACT)


solid = part.part
